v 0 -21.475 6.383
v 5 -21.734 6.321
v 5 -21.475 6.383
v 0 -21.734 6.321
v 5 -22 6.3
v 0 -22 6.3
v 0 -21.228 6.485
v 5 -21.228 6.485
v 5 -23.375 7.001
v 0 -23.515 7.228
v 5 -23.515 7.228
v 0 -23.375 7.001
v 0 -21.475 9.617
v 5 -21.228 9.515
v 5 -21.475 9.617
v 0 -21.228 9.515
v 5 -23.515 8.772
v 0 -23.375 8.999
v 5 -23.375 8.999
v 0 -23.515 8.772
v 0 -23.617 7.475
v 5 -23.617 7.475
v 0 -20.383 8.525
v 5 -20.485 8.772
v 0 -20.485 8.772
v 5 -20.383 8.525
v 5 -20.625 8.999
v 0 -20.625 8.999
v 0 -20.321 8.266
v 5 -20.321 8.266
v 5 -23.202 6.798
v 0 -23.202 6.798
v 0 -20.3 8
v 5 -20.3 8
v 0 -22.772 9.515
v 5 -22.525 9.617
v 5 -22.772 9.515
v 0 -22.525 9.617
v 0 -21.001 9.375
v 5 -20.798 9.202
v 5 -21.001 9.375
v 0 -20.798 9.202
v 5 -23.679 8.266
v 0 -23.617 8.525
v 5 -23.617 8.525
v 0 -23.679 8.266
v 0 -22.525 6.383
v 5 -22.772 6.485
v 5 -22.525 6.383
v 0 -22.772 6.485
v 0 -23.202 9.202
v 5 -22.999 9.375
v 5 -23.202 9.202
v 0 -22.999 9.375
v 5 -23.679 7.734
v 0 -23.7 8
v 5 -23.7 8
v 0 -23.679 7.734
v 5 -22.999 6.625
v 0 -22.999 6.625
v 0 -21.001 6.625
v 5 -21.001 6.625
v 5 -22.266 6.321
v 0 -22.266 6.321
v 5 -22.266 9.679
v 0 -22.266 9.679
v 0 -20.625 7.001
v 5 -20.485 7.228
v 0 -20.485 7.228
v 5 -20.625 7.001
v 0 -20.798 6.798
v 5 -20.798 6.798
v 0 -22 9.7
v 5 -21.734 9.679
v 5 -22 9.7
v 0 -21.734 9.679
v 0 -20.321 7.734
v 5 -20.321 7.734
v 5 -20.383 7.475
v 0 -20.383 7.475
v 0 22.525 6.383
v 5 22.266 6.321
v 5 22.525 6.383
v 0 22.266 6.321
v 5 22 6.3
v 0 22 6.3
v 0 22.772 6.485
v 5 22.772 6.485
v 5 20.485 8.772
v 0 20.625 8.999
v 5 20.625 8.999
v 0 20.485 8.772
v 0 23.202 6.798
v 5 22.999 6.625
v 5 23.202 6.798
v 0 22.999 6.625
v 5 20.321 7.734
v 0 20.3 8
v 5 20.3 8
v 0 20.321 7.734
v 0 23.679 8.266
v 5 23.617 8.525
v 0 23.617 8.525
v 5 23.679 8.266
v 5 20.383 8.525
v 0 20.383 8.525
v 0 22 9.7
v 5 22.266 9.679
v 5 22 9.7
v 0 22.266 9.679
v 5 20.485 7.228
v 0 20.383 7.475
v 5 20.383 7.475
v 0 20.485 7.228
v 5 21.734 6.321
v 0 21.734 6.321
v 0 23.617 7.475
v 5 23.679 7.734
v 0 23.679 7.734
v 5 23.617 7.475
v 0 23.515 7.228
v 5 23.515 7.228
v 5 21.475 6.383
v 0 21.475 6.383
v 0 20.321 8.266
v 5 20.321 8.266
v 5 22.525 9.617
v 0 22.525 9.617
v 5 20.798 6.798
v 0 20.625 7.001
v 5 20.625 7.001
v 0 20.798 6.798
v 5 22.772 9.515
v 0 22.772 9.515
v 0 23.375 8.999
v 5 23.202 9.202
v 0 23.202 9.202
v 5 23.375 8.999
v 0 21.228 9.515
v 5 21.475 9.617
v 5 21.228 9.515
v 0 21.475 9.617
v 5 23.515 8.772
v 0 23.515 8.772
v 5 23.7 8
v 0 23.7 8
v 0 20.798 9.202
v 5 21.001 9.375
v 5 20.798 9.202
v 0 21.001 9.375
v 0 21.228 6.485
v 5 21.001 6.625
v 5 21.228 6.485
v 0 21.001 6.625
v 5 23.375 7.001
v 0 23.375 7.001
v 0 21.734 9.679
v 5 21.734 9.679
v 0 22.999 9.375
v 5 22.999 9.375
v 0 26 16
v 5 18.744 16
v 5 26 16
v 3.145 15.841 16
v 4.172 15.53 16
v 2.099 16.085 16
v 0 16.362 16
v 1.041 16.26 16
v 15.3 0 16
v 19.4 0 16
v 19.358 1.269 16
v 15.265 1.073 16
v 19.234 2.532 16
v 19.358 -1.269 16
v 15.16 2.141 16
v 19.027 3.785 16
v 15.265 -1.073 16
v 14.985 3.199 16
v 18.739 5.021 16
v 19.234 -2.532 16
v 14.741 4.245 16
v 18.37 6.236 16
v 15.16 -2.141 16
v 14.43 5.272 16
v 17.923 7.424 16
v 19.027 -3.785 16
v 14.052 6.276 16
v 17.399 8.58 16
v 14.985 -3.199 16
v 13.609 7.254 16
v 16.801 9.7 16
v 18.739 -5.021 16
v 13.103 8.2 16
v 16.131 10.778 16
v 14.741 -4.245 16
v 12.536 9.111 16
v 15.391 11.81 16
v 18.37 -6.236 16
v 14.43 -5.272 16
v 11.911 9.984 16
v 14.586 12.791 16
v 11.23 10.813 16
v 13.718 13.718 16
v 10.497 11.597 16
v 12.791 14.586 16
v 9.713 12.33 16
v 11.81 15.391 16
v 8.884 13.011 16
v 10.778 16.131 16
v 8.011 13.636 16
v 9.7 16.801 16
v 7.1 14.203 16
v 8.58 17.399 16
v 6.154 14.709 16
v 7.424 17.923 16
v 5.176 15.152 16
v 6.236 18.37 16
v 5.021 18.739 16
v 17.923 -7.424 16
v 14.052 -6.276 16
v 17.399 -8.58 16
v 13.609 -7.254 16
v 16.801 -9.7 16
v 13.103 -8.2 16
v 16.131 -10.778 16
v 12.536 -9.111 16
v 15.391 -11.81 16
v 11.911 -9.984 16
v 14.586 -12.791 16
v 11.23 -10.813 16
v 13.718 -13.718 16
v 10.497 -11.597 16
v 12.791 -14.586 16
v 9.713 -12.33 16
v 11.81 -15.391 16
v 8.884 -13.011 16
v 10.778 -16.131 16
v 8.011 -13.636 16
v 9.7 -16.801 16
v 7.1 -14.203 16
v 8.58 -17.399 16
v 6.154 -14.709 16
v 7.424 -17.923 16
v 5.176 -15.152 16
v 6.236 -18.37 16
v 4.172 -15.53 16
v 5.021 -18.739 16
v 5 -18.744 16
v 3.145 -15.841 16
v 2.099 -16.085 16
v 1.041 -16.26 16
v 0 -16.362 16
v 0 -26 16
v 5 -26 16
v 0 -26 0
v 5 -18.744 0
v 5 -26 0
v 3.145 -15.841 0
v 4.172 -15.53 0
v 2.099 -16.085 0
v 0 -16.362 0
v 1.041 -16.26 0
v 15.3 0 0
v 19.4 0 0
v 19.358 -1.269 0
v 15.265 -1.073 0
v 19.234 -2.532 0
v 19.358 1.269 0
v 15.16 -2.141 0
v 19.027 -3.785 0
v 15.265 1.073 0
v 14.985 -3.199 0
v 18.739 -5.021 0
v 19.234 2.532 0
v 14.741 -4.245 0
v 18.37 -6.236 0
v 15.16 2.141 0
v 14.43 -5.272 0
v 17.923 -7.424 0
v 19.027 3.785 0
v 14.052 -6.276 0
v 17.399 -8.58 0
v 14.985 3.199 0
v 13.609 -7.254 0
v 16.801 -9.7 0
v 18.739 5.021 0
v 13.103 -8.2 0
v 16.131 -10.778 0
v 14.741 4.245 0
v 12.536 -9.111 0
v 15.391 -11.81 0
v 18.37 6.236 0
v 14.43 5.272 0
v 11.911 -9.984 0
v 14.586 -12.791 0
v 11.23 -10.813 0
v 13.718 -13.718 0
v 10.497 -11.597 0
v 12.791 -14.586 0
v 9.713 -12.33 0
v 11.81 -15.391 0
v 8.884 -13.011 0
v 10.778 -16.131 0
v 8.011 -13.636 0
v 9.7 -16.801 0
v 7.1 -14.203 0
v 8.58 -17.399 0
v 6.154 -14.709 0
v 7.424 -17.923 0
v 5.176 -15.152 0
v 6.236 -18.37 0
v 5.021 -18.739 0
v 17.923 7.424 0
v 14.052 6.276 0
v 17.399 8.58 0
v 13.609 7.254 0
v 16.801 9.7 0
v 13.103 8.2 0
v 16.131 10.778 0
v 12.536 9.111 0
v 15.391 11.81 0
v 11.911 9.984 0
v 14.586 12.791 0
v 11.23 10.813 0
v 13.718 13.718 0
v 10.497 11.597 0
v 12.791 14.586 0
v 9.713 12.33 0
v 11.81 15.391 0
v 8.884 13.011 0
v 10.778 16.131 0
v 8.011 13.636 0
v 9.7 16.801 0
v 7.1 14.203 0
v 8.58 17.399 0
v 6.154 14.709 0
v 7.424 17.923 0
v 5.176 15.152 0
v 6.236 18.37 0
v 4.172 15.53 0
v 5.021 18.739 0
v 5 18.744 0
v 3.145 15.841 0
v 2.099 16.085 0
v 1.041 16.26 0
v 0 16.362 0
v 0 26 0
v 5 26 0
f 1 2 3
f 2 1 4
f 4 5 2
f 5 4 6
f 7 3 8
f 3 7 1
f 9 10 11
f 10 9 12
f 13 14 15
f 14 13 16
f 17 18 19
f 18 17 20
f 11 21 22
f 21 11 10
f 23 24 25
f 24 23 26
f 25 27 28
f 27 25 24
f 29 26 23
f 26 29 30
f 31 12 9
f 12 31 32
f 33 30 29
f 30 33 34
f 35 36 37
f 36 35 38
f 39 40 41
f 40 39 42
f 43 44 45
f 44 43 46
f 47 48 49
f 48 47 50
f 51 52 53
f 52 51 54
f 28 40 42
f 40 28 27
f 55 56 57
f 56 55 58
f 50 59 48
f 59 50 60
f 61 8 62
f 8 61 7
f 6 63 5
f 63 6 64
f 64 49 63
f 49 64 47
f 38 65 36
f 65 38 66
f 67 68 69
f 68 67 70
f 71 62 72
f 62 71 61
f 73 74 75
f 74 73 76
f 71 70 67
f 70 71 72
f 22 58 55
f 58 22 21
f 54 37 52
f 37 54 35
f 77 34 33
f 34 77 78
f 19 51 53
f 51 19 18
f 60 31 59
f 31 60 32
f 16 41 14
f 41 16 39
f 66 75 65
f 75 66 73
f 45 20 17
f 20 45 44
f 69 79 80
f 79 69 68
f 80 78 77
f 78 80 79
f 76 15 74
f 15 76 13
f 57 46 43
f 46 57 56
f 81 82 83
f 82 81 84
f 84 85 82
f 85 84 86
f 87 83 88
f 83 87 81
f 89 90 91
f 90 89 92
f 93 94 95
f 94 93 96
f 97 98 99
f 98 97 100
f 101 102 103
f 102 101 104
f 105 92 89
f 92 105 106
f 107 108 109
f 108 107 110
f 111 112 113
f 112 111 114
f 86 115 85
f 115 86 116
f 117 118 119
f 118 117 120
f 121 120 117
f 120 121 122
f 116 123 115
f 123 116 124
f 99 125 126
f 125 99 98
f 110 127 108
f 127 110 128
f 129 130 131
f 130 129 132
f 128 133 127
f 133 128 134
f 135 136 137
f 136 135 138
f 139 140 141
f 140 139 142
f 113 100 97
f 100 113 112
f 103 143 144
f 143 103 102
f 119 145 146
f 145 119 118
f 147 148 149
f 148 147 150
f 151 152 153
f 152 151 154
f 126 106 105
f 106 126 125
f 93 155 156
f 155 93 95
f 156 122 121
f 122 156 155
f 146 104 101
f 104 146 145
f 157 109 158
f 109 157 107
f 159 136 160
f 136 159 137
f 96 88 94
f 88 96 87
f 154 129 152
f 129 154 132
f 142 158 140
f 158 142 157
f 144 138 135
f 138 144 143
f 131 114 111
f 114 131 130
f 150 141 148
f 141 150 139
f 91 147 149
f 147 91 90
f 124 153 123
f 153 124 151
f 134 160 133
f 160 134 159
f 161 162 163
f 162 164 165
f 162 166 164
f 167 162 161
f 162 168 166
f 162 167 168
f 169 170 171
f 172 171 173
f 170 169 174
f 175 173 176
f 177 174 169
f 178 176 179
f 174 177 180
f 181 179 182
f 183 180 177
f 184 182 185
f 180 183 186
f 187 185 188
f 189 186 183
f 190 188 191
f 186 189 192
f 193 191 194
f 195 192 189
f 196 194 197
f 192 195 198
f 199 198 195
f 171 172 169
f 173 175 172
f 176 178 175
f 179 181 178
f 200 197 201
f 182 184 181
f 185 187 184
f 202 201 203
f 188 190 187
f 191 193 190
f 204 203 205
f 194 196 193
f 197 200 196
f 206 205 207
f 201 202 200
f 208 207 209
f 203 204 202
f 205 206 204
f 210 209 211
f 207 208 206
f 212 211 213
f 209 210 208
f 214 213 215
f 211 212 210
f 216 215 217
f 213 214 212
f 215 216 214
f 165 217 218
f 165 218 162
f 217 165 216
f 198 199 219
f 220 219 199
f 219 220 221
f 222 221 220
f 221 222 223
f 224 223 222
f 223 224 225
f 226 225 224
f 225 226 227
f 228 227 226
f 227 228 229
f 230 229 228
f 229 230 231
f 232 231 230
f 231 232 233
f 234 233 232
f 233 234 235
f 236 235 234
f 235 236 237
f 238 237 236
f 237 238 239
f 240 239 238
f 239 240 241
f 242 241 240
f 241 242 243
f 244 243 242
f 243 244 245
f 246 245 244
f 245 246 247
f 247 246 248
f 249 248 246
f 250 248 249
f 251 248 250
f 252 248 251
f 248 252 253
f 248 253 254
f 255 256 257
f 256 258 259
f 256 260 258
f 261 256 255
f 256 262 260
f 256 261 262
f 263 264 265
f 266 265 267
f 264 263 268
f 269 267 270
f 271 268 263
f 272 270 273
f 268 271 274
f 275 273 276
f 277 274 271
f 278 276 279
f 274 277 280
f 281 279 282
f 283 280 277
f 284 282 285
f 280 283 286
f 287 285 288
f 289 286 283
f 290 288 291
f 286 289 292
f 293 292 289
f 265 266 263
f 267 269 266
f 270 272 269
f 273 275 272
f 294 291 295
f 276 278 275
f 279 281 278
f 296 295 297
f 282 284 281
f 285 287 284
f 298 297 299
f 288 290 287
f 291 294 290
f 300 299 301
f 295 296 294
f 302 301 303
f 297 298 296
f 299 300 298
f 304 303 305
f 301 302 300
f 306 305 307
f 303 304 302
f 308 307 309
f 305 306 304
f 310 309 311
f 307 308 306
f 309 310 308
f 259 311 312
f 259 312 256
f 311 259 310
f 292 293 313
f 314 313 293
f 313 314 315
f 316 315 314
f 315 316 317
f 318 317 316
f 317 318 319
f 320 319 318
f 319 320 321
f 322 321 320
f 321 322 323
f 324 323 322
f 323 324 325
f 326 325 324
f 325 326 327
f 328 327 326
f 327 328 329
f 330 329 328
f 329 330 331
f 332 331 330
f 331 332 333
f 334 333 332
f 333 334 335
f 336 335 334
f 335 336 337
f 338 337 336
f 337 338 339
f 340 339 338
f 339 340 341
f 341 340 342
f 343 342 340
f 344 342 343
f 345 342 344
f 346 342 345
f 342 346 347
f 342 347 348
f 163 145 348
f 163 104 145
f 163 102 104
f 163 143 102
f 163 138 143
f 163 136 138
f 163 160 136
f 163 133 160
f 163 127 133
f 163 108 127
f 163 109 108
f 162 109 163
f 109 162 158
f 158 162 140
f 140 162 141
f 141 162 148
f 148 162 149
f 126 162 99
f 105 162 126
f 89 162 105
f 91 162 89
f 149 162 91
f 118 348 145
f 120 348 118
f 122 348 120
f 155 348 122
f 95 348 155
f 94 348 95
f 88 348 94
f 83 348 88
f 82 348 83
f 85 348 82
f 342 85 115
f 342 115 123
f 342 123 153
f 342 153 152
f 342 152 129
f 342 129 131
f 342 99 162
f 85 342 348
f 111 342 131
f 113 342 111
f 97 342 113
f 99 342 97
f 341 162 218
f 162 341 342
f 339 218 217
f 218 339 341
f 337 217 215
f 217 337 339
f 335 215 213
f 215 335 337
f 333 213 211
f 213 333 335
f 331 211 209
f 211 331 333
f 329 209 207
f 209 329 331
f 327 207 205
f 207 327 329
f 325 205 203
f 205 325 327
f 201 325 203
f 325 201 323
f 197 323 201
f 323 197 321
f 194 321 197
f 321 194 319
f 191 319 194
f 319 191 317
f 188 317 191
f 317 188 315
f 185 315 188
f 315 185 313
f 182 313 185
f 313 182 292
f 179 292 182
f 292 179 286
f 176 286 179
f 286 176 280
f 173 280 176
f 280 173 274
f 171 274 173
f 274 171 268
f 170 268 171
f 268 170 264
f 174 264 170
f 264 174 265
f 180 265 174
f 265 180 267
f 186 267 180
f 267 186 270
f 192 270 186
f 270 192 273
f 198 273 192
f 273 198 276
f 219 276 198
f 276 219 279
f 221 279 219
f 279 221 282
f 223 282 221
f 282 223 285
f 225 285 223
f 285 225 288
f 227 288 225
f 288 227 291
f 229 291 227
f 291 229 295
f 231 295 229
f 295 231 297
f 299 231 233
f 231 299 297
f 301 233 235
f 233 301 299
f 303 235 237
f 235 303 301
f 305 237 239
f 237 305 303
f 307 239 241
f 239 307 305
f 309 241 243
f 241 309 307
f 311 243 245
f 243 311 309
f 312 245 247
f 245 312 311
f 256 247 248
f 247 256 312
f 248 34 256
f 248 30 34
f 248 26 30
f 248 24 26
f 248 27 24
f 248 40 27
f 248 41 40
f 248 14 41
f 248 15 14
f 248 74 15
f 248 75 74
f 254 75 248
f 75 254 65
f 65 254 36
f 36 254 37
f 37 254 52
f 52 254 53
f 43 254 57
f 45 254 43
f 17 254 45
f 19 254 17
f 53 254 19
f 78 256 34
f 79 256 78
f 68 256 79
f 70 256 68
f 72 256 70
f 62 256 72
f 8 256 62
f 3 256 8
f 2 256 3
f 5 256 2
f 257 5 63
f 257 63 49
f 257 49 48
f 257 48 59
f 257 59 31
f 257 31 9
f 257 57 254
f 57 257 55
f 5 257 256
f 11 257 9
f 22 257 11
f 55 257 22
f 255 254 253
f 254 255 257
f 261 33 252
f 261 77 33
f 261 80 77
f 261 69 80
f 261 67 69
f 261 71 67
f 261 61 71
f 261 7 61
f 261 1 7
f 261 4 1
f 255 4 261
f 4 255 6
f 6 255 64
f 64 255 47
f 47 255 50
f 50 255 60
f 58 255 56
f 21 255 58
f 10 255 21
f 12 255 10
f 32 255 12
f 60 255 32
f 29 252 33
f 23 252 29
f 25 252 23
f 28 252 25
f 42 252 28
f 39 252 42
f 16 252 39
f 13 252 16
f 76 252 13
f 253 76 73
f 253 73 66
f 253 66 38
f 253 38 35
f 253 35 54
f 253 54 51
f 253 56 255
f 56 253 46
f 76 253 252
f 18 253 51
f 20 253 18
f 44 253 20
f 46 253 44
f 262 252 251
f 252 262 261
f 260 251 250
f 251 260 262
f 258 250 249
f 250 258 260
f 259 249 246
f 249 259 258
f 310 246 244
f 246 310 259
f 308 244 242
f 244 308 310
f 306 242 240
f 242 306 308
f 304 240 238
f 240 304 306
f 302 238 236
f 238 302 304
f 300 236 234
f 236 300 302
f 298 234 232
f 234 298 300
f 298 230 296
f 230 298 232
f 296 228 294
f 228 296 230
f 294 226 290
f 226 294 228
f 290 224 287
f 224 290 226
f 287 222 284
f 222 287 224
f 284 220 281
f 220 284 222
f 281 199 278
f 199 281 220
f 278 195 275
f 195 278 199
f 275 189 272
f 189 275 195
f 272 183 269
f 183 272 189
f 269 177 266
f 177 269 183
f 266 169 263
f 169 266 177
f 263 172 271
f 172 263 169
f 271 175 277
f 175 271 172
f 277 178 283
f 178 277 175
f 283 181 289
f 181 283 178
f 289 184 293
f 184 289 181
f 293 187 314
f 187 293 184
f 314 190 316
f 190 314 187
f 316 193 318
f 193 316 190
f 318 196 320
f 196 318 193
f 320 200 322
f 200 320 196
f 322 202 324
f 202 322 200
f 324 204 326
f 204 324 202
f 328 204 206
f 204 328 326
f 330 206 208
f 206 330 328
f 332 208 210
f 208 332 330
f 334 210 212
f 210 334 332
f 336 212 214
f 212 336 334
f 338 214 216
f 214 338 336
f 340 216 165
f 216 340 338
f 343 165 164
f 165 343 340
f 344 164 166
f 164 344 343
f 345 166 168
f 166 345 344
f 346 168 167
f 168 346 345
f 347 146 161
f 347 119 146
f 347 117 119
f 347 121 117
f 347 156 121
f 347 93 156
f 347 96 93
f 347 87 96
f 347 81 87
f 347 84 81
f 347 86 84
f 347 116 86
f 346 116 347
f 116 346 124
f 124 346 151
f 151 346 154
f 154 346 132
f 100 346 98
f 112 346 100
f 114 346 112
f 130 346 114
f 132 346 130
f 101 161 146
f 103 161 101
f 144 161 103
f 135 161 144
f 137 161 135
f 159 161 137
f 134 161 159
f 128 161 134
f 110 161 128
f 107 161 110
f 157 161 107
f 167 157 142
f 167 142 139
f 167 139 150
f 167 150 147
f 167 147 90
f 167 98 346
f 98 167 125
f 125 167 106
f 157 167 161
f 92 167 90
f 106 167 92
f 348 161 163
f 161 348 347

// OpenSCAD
include <../lib/apache-case-modules-lib.scad>;
$fn = 40;
strap_print();
